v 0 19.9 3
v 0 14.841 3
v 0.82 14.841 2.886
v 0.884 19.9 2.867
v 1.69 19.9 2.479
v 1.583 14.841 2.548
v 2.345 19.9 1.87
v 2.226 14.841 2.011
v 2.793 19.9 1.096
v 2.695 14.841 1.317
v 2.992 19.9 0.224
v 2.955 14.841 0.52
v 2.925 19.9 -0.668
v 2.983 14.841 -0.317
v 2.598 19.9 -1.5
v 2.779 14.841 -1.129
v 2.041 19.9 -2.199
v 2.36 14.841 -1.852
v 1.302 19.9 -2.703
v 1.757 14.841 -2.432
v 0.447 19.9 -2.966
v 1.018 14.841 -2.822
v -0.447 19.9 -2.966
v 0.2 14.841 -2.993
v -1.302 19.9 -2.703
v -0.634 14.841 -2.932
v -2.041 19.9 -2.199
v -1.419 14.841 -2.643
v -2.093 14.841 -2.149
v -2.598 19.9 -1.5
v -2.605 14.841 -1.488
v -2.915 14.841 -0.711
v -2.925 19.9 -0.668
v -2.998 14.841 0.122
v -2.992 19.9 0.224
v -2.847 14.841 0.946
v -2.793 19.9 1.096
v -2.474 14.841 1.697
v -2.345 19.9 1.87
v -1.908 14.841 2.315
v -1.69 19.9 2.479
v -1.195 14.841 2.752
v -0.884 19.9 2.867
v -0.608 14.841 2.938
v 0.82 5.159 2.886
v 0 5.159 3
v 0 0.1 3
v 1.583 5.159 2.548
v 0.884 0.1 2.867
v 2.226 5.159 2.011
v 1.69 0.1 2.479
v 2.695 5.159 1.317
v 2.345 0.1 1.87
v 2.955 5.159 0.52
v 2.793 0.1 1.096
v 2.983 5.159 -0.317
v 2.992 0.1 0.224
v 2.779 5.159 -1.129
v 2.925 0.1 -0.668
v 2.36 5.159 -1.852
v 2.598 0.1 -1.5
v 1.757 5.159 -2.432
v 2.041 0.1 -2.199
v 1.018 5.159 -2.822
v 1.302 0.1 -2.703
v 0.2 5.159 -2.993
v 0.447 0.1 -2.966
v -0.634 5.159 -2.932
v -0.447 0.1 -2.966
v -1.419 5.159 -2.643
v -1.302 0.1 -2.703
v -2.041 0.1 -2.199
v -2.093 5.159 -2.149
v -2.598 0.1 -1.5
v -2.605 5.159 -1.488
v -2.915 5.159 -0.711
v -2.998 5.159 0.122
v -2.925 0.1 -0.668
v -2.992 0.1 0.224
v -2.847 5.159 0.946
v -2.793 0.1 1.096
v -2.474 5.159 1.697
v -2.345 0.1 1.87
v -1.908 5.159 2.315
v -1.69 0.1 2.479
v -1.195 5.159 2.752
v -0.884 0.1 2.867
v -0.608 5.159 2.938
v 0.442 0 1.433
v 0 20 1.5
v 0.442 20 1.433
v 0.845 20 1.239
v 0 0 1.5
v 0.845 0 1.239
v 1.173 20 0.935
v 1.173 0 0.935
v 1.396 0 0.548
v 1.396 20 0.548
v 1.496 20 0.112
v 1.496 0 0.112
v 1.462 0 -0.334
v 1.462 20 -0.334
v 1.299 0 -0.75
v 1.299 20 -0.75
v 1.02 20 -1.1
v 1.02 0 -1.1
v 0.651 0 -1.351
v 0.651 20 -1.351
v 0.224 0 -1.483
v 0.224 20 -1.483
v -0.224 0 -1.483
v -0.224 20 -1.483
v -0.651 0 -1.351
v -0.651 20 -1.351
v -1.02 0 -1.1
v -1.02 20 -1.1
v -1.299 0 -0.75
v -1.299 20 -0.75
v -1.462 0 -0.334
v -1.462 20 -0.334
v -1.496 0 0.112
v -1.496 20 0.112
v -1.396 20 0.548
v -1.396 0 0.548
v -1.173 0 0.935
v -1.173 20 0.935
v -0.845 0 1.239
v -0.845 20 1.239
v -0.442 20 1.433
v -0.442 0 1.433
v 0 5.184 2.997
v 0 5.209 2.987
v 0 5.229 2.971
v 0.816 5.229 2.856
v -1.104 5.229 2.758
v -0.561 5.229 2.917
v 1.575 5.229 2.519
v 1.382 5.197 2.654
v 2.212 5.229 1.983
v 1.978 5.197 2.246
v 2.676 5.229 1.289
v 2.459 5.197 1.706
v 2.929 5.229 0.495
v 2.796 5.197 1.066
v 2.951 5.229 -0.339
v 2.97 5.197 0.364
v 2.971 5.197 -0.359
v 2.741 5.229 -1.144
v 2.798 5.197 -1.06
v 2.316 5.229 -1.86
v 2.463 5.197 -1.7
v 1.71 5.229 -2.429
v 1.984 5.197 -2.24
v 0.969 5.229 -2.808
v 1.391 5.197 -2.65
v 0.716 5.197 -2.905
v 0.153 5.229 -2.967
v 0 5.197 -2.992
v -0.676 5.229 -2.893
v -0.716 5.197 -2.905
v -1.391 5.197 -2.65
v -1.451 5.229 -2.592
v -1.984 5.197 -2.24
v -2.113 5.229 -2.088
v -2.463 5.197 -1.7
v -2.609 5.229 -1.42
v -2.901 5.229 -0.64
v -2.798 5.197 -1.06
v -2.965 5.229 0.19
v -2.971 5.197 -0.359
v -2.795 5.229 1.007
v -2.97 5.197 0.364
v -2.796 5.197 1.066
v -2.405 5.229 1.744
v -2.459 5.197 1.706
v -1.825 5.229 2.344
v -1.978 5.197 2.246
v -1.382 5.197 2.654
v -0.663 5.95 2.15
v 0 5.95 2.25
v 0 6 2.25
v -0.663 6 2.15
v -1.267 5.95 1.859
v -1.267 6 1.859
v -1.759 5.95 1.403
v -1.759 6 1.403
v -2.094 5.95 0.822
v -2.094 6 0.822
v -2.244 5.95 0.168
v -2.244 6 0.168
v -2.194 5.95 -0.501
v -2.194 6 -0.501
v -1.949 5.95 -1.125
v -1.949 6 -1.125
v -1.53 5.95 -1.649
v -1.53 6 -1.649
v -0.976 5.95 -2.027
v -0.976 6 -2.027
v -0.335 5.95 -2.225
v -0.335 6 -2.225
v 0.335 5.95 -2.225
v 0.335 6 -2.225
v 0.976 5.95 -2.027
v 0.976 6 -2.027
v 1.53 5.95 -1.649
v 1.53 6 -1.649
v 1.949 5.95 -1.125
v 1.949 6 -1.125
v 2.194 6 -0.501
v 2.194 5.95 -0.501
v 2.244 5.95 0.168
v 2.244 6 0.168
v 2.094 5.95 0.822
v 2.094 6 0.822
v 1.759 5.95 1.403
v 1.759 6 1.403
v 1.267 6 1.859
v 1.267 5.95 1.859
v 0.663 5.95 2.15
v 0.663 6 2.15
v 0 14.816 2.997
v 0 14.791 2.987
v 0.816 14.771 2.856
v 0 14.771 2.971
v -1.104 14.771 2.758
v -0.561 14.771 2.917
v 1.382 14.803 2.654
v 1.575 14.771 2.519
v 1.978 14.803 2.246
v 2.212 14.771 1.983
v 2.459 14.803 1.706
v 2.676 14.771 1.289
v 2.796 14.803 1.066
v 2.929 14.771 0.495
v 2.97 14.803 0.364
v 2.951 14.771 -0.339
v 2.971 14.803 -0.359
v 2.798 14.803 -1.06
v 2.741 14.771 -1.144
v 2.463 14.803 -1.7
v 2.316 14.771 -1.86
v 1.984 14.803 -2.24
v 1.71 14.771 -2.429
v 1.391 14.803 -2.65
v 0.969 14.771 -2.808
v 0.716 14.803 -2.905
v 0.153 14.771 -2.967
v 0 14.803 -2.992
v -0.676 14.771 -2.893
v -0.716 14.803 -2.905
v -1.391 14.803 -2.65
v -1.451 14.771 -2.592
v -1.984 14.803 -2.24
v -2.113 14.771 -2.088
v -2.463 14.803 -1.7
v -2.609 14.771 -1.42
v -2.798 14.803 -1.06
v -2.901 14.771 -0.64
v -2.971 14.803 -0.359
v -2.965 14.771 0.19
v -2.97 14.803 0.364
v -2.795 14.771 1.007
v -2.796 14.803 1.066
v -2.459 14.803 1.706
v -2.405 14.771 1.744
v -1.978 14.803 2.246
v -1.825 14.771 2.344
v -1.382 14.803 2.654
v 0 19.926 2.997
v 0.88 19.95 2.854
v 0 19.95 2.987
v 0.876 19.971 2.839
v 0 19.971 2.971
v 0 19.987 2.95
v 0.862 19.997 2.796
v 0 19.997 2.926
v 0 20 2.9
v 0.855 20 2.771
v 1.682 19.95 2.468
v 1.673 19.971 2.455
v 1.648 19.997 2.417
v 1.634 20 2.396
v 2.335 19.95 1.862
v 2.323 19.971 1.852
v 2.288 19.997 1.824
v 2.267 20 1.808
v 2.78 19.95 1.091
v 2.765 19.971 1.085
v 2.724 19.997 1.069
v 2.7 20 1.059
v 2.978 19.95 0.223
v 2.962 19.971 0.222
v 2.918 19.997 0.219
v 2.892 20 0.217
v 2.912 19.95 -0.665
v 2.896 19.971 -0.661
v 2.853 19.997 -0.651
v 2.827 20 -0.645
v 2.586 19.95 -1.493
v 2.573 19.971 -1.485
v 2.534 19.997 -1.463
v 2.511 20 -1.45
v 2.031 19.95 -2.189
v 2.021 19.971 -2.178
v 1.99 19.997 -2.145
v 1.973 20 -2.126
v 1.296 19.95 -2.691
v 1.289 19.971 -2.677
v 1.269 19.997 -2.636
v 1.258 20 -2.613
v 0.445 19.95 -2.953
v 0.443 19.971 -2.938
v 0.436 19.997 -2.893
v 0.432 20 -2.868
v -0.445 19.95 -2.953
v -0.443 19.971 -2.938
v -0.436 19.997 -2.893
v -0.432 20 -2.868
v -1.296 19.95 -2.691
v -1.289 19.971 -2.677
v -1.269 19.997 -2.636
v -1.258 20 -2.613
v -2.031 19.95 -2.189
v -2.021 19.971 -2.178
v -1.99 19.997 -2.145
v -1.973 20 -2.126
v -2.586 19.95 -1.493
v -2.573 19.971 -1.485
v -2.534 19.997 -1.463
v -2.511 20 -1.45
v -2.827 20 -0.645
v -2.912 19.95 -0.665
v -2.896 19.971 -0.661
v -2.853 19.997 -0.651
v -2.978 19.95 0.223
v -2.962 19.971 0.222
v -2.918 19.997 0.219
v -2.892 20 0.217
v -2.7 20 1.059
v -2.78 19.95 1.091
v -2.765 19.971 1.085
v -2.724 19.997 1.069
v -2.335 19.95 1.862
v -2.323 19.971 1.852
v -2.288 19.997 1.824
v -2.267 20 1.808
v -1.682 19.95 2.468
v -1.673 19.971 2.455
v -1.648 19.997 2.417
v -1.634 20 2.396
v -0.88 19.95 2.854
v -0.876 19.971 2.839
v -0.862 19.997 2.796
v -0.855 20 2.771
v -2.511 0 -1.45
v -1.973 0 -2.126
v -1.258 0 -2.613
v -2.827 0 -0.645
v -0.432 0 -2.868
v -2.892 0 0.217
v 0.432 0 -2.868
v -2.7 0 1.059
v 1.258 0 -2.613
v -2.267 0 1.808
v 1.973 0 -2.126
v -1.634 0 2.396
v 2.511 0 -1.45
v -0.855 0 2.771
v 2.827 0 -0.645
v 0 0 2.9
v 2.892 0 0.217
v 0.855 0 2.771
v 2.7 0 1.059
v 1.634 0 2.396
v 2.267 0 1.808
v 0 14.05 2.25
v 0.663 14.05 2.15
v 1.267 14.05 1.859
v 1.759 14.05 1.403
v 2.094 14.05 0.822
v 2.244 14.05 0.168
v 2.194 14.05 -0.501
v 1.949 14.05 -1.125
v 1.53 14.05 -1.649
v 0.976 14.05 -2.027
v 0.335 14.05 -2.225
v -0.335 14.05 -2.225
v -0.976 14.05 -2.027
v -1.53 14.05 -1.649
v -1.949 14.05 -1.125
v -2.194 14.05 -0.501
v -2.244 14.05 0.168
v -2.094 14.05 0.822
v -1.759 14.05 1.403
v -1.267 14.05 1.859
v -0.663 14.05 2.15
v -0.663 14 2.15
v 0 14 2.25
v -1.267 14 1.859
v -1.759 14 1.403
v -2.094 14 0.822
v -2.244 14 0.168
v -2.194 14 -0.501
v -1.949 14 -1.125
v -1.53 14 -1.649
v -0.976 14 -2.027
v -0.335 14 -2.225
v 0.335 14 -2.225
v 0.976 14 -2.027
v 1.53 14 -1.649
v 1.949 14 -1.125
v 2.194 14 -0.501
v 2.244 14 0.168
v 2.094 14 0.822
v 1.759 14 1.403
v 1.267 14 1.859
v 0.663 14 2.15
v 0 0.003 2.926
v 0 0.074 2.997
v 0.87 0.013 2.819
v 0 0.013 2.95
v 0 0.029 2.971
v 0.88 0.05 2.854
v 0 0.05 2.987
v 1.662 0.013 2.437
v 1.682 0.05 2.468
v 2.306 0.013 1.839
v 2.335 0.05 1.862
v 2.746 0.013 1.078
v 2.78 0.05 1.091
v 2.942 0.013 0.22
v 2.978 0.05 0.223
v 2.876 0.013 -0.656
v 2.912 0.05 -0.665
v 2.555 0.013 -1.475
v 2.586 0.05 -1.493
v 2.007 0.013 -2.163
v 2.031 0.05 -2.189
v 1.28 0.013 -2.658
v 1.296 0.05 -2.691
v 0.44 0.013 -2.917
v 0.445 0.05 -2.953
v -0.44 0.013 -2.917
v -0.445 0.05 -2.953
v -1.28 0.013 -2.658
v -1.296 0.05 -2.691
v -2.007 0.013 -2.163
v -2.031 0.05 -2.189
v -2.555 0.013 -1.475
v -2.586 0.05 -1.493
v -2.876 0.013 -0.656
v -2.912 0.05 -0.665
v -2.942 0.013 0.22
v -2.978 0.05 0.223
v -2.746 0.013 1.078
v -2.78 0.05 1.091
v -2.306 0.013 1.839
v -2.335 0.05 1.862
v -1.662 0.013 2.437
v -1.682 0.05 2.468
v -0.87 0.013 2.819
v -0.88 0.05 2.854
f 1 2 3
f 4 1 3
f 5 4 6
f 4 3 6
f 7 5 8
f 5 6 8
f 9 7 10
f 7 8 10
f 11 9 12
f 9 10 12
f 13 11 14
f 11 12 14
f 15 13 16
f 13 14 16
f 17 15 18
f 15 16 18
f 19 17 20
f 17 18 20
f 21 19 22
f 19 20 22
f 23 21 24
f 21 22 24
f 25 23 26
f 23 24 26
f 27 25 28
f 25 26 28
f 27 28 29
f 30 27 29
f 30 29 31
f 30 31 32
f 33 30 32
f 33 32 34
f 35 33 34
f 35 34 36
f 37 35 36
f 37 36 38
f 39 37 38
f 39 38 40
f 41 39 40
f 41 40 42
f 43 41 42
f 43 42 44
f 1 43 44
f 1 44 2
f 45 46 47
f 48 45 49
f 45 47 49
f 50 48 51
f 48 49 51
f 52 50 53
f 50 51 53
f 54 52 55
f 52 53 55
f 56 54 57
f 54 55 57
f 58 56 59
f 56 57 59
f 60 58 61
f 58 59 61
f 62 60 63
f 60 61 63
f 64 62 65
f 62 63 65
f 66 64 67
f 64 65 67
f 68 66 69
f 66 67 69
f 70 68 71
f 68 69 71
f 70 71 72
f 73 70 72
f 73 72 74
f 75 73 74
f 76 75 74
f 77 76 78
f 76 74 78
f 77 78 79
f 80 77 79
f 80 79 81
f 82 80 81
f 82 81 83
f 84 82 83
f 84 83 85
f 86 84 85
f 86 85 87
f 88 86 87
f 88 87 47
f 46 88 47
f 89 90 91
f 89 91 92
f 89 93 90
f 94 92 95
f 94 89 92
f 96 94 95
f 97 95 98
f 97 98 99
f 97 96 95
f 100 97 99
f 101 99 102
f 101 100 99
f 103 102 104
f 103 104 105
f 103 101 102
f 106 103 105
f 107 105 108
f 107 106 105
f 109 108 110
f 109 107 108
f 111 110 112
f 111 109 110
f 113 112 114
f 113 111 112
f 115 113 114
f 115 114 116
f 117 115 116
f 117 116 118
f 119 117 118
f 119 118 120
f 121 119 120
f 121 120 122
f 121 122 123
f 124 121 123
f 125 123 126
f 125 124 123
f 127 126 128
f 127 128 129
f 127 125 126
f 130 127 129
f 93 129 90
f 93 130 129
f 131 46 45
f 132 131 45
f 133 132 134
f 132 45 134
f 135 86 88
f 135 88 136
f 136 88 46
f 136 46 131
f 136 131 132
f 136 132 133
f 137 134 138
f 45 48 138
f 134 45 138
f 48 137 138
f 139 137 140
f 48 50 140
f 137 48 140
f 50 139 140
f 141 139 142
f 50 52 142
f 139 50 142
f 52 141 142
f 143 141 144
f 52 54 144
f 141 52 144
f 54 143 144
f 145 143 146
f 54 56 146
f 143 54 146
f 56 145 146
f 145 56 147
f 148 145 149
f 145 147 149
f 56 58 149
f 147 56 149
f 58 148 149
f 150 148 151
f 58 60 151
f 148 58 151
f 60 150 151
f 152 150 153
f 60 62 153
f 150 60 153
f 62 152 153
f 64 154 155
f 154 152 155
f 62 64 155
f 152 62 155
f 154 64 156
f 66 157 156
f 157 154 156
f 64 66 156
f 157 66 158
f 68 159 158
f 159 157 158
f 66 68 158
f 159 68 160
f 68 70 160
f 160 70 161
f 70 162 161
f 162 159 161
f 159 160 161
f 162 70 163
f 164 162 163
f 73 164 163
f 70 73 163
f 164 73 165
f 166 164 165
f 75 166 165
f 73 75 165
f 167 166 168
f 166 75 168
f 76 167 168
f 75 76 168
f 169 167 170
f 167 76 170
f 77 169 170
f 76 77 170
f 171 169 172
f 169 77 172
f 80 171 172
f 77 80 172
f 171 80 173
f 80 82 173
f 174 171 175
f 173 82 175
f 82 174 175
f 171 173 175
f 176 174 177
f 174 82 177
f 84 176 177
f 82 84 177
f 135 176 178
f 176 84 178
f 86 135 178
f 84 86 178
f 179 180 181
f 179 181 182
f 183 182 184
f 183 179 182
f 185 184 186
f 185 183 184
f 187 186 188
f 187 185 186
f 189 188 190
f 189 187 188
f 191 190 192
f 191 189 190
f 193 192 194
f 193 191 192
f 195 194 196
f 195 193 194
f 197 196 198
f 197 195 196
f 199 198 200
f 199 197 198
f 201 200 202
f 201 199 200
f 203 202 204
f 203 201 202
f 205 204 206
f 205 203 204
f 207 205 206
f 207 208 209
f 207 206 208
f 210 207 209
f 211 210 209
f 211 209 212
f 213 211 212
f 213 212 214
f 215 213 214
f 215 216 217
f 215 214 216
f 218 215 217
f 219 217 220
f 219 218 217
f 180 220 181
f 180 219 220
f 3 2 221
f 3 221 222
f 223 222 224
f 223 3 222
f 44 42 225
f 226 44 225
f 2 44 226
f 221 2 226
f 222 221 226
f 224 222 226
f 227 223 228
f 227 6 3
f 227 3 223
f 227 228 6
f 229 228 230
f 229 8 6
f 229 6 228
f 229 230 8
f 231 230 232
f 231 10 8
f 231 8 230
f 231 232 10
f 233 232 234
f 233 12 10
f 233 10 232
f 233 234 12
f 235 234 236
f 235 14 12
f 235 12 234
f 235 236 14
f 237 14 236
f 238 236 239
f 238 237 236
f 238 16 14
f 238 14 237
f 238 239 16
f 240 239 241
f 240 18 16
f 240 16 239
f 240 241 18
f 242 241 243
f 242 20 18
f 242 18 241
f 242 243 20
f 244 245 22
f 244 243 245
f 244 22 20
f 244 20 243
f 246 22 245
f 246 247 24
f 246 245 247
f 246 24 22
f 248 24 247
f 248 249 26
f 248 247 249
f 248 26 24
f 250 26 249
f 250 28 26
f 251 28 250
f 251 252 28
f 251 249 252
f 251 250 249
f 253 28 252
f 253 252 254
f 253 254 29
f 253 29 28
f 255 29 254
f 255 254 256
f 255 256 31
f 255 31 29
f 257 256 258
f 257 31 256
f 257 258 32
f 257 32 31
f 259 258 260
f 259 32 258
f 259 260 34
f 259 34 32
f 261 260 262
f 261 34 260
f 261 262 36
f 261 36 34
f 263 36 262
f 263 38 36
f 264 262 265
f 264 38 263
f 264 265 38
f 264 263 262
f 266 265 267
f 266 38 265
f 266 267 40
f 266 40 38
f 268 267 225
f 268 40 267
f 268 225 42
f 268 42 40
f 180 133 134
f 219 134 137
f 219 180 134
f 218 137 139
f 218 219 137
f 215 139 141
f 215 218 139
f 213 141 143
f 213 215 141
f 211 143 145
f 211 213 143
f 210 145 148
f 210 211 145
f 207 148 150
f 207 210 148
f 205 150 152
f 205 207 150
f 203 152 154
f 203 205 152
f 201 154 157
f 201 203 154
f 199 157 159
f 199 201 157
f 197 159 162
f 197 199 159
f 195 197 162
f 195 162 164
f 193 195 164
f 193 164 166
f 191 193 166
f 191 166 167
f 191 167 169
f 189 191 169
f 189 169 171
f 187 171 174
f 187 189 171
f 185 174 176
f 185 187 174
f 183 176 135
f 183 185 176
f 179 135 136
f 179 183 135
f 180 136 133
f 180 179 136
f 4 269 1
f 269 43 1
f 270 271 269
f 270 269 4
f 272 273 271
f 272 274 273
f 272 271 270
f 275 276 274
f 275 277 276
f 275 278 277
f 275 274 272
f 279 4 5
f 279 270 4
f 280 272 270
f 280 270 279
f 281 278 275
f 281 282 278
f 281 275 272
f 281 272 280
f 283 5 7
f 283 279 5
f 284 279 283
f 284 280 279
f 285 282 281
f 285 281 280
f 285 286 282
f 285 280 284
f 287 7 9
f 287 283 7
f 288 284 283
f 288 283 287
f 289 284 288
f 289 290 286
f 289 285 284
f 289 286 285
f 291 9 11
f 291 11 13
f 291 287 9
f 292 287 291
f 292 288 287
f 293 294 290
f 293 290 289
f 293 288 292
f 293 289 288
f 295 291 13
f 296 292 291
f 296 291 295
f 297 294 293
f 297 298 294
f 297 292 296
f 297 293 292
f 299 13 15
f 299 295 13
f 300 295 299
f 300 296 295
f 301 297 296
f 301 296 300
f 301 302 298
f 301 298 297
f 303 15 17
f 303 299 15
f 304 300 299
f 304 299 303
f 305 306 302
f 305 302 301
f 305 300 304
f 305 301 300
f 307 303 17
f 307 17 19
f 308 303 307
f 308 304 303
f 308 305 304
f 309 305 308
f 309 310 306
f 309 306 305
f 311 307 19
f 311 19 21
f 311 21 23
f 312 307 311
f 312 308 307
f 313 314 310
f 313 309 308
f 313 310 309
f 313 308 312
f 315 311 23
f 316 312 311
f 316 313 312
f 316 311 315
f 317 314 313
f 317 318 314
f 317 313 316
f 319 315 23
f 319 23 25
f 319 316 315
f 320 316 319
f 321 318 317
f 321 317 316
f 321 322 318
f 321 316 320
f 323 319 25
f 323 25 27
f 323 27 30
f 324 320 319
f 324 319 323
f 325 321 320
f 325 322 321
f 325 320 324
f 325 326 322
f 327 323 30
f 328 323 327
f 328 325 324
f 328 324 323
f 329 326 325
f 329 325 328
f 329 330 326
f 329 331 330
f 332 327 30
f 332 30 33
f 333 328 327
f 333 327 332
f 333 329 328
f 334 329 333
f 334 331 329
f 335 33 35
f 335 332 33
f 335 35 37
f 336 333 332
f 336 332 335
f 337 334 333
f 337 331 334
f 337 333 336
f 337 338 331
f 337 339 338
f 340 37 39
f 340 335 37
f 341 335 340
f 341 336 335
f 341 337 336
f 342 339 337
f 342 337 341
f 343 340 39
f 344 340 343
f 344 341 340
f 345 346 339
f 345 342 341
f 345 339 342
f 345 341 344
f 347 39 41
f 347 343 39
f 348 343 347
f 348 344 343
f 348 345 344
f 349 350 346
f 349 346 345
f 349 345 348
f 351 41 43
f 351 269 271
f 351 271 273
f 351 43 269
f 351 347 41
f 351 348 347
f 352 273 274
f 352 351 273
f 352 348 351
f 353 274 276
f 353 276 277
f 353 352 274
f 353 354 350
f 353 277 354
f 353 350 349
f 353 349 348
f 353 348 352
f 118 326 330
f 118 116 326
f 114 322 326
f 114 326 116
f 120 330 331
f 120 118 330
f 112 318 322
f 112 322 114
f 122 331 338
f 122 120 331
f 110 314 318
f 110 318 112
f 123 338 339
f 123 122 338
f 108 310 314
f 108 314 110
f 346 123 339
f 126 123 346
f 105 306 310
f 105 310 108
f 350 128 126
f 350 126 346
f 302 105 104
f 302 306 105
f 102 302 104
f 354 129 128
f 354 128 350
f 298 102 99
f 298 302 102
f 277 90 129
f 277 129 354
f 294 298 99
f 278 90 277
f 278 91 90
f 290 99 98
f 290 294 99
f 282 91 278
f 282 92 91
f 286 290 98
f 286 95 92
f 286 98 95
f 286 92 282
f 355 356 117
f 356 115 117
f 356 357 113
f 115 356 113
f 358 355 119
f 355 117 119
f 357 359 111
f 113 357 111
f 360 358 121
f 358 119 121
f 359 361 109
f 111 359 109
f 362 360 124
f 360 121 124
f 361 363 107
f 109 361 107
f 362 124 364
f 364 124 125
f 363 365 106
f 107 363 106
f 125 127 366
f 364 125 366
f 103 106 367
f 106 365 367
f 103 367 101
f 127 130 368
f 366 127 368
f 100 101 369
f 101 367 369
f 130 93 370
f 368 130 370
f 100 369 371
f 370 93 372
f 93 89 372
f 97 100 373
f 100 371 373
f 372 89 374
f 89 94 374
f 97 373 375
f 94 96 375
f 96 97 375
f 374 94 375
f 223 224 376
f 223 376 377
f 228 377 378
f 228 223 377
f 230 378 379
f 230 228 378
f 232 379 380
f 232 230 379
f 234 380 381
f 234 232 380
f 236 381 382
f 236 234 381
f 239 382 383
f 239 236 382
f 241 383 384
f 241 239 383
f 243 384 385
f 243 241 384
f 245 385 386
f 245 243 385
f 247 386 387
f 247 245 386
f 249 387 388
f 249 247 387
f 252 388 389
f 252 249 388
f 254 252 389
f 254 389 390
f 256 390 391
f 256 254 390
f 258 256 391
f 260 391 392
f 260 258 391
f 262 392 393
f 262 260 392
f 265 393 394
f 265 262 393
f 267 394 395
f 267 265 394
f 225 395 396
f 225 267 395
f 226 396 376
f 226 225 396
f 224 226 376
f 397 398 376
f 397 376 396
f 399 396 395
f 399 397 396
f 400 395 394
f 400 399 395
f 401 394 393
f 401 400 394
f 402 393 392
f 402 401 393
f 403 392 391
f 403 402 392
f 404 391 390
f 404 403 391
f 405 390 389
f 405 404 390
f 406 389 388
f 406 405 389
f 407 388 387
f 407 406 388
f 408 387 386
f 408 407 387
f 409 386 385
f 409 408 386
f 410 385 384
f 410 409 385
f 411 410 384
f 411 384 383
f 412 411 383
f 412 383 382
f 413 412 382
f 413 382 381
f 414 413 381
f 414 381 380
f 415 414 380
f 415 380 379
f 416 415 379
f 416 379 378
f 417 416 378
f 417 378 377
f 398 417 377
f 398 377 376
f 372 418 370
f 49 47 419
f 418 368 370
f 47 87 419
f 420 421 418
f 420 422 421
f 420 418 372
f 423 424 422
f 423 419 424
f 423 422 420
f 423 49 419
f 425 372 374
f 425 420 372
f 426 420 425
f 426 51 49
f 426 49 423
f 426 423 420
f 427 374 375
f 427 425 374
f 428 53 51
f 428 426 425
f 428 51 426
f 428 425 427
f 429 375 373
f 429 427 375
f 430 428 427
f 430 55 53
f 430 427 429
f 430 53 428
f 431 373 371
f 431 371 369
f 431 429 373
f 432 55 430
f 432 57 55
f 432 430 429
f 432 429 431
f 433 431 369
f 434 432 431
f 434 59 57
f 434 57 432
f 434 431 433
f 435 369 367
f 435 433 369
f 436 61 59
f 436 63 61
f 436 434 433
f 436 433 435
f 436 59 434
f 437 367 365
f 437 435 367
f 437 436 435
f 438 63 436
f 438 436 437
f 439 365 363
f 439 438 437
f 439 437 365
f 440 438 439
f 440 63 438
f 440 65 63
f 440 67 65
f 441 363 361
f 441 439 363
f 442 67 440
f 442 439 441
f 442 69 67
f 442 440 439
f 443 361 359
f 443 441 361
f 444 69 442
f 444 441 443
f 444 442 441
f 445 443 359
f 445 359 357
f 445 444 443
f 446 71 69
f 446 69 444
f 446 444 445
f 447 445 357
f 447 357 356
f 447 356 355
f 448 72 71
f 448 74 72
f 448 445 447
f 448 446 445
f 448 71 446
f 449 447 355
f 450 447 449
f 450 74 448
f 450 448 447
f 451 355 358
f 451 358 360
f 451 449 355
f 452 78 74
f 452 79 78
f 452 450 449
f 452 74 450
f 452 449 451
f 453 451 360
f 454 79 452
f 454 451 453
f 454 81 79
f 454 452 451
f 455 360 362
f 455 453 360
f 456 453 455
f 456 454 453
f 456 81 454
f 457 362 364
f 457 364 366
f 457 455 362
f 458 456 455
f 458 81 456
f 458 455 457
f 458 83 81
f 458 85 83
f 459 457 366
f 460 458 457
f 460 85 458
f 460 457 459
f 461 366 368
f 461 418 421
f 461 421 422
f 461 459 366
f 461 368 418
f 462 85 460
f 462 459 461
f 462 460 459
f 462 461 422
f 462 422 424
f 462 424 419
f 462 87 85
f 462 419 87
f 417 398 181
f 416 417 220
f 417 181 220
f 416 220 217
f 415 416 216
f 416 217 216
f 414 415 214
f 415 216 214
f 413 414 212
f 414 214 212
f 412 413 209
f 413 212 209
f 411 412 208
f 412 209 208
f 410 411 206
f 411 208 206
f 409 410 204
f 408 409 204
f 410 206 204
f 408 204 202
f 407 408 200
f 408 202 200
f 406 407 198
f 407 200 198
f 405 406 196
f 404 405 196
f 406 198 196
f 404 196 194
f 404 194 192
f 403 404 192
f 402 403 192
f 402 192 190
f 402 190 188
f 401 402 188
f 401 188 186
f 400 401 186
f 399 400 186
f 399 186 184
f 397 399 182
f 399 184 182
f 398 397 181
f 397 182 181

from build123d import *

# Parameters (mm, degrees)
SKETCH_1_R      = 3
SKETCH_1_R_2    = 1.5
EXTRUDE_1_DEPTH = 6
SKETCH_2_R      = 2.25
SKETCH_2_R_2    = 1.5
EXTRUDE_2_DEPTH = 8
SKETCH_3_R      = 3
SKETCH_3_R_2    = 1.5
EXTRUDE_3_DEPTH = 6
CHAMFER_1_SIZE  = 0.8
FILLET_1_R      = 0.1


with BuildPart() as part:
    # 草图1 → 凸台-拉伸1 (new body)
    with BuildSketch(Plane(origin=(0, 0, 0), x_dir=(1, 0, 0), z_dir=(0, 1, 0))):
        with Locations(Location((0, 0, 0), (0, 0, 270))):
            Circle(SKETCH_1_R)
        with Locations(Location((0, 0, 0), (0, 0, 270))):
            Circle(SKETCH_1_R_2, mode=Mode.SUBTRACT)
    extrude(amount=EXTRUDE_1_DEPTH)

    # 草图2 → 凸台-拉伸2 (add)
    with BuildSketch(Plane(origin=(0, 6, 0), x_dir=(1, 0, 0), z_dir=(0, 1, 0))):
        with Locations(Location((0, 0, 0), (0, 0, 270))):
            Circle(SKETCH_2_R)
        with Locations(Location((0, 0, 0), (0, 0, 270))):
            Circle(SKETCH_2_R_2, mode=Mode.SUBTRACT)
    extrude(amount=EXTRUDE_2_DEPTH)

    # 草图3 → 凸台-拉伸3 (add)
    with BuildSketch(Plane(origin=(0, 14, 0), x_dir=(1, 0, 0), z_dir=(0, 1, 0))):
        with Locations(Location((0, 0, 0), (0, 0, 270))):
            Circle(SKETCH_3_R)
        with Locations(Location((0, 0, 0), (0, 0, 270))):
            Circle(SKETCH_3_R_2, mode=Mode.SUBTRACT)
    extrude(amount=EXTRUDE_3_DEPTH)

    # 倒角1
    # the kernel refuses this chamfer: 0.8 mm, written as the material it takes off along each edge
    with BuildSketch(Plane(origin=(0, 6, 0), x_dir=(0, 0, 1), z_dir=(-1, 0, 0))) as chamfer_1_piece_1_section:
        Polygon((3, -CHAMFER_1_SIZE), (3 - CHAMFER_1_SIZE, 0), (3, 0), align=None)
    chamfer_1_piece_1 = revolve(axis=Axis((0, 6, 0), (0, 1, 0)), mode=Mode.PRIVATE)
    chamfer_1_piece_1 = chamfer_1_piece_1 - Plane(origin=(0, 5.57653803, 0), x_dir=(0, 0, 1), z_dir=(0, -1, 0)) * Cylinder(2.25, 12, mode=Mode.PRIVATE)
    add(chamfer_1_piece_1, mode=Mode.SUBTRACT)
    with BuildSketch(Plane(origin=(0, 14, 0), x_dir=(0, 0, 1), z_dir=(-1, 0, 0))) as chamfer_1_piece_2_section:
        Polygon((3 - CHAMFER_1_SIZE, 0), (3, CHAMFER_1_SIZE), (3, 0), align=None)
    chamfer_1_piece_2 = revolve(axis=Axis((0, 14, 0), (0, 1, 0)), mode=Mode.PRIVATE)
    chamfer_1_piece_2 = chamfer_1_piece_2 - Plane(origin=(0, 14.42346197, 0), x_dir=(0, 0, 1), z_dir=(0, -1, 0)) * Cylinder(2.25, 13, mode=Mode.PRIVATE)
    add(chamfer_1_piece_2, mode=Mode.SUBTRACT)

    # 圆角1
    fillet_1_edges = [part.edges().sort_by_distance(p)[0] for p in [
        (0, 20, -3),
        (0, 0, -3),
        (0, 5.2, -3),
        (0, 14.8, -3),
    ]]
    fillet(fillet_1_edges, radius=FILLET_1_R)


solid = part.part
